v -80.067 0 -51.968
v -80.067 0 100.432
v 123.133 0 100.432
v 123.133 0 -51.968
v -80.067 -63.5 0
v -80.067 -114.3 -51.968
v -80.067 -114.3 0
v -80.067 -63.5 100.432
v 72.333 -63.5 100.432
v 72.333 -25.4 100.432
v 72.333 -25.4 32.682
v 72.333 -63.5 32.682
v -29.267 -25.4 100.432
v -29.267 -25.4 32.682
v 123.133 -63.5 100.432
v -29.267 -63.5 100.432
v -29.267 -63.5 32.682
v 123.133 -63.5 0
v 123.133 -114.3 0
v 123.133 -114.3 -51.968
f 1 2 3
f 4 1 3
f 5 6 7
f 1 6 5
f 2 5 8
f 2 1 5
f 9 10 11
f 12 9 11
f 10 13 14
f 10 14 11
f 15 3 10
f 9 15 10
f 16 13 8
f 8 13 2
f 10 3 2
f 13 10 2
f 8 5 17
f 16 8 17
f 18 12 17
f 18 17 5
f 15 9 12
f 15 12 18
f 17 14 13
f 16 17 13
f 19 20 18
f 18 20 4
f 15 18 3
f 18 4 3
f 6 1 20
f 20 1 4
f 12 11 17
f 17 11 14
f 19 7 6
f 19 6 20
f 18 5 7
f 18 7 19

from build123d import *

# Parameters (mm, degrees)
F0_W     = 203.2
F0_H     = 152.4
F1_DEPTH = 25.4
F3_DEPTH = 38.1
F4_W     = 203.2
F4_H     = 51.9680035462
F5_DEPTH = 50.8


# Not quite as in the source:
# - a feature names something its author has since deleted; it is built from what else it names


with BuildPart() as f1:
    # F0 (on Front) → F1 (new body)
    with BuildSketch(Plane.XZ):
        with Locations((21.5330033839, 24.2319964538)):
            Rectangle(F0_W, F0_H)
    extrude(amount=F1_DEPTH)

    # F2 (on face) → F3 (join)
    with BuildSketch(Plane.XZ.offset(25.4)):
        Polygon((-29.2669966161, 32.6819717884), (-29.2669966161, 100.4319964538), (-80.0669966161, 100.4319964538), (-80.0669966161, -51.9680035462), (123.1330033839, -51.9680035462), (123.1330033839, 100.4319964538), (72.3330033839, 100.4319964538), (72.3330033839, 32.6819717884), align=None)
    extrude(amount=F3_DEPTH)

    # F4 (on face) → F5 (join)
    with BuildSketch(Plane.XZ.offset(63.5)):
        with Locations((21.5330033839, -25.9840017731)):
            Rectangle(F4_W, F4_H)
    extrude(amount=F5_DEPTH)


solid = f1.part
